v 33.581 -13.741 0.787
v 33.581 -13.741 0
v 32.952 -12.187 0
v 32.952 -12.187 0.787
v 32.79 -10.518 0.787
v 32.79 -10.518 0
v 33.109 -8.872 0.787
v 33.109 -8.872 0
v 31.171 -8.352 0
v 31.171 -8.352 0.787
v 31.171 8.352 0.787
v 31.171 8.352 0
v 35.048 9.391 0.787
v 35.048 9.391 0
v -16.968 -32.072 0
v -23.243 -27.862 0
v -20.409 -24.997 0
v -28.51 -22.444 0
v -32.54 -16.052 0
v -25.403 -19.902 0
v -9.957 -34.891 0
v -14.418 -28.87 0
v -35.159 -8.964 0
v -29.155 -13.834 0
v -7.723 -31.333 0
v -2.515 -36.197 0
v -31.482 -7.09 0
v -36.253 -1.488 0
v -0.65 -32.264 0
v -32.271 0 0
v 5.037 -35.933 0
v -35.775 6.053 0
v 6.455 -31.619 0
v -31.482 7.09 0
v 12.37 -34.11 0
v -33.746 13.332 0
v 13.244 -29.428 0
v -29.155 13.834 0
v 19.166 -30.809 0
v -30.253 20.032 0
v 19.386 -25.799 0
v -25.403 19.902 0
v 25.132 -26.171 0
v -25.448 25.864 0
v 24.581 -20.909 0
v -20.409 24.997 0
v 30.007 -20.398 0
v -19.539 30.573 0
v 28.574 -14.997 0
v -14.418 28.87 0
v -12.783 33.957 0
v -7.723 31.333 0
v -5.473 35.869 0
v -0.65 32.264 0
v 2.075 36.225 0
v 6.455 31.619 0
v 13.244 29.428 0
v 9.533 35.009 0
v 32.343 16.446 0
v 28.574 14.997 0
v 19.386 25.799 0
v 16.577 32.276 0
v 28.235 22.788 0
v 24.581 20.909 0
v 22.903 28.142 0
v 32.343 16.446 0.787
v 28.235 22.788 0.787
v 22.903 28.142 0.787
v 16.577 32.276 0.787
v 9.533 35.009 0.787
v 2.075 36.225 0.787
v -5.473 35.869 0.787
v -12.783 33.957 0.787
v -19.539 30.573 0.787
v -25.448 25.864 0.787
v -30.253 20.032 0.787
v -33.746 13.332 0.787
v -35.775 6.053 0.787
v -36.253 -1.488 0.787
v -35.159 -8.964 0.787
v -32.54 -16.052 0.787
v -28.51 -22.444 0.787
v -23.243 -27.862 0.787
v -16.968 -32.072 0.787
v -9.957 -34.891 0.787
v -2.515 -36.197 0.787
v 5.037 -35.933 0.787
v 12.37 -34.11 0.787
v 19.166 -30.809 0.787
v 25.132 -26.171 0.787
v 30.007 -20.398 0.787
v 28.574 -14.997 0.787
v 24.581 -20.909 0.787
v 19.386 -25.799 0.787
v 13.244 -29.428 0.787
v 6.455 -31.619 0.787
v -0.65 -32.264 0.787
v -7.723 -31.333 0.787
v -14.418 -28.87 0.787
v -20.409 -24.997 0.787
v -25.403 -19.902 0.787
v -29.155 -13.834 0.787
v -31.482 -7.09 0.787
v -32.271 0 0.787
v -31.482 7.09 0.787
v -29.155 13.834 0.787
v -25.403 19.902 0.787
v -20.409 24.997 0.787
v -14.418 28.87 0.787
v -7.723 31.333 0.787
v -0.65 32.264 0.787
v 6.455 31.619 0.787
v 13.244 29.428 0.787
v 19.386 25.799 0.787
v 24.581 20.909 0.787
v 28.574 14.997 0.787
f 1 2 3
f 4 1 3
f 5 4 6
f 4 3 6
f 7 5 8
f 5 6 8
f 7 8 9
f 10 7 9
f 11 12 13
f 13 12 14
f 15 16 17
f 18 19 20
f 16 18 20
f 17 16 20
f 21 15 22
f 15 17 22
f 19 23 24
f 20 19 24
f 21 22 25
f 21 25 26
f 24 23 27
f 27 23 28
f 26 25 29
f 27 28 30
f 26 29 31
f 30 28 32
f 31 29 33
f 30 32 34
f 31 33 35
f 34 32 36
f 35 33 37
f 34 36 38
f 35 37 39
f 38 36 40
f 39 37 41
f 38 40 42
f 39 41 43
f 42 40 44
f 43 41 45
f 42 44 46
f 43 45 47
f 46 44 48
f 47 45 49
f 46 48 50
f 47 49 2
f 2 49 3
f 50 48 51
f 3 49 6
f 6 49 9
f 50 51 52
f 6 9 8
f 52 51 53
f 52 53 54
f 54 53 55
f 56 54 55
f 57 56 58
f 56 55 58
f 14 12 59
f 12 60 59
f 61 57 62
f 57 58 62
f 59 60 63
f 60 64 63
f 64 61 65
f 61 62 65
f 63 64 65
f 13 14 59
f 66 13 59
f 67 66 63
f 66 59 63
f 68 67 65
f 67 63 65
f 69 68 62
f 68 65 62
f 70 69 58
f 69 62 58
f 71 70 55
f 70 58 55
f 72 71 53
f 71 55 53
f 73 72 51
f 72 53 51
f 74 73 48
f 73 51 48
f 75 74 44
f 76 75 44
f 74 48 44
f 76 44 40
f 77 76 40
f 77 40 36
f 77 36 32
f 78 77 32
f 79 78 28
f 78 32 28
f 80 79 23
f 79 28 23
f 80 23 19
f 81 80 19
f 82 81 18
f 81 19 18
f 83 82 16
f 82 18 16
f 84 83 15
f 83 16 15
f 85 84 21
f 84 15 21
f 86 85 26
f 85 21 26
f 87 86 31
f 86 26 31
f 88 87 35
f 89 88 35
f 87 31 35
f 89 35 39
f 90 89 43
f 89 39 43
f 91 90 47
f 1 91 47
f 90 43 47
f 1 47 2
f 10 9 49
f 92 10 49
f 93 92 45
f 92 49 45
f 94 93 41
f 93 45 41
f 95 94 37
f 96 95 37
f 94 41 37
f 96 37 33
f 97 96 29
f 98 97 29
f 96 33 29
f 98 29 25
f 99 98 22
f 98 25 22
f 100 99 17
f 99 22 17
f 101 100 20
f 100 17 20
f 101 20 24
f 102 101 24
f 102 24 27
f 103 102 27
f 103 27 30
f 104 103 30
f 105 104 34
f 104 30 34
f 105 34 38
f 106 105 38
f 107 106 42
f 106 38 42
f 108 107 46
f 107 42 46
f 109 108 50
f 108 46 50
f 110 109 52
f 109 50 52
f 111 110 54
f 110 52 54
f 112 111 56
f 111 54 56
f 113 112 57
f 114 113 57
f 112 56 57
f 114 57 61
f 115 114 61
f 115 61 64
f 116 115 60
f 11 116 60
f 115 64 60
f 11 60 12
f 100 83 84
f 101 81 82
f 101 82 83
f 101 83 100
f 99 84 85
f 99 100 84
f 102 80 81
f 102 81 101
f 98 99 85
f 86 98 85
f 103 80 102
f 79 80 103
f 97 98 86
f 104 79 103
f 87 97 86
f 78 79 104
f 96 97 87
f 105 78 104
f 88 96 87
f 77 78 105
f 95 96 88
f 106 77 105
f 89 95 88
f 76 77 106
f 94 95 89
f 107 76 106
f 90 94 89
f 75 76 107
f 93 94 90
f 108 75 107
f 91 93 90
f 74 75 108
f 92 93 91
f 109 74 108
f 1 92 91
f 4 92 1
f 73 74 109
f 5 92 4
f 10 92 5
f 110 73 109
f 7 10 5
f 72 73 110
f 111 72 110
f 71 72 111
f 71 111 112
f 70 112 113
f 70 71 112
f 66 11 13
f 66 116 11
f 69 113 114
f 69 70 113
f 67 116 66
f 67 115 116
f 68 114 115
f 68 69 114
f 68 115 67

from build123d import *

# Parameters (mm, degrees)
BOSS_EXTRUDE1_DEPTH = 0.7874


with BuildPart() as part:
    # Sketch2 → Boss-Extrude1 (new body)
    with BuildSketch(Plane.XY):
        with BuildLine():
            Line((31.171102562, 8.352271759), (33.109329325, 8.871618055))
            Line((33.109329325, 8.871618055), (35.047556088, 9.390964351))
            ThreePointArc((35.047556088, 9.390964351), (-36.211242798, 2.295058655), (33.581480457, -13.740653898))
            ThreePointArc((33.581480457, -13.740653898), (32.810406003, -11.358014898), (33.109329325, -8.871618055))
            Line((33.109329325, -8.871618055), (31.171102562, -8.352271759))
            ThreePointArc((31.171102562, -8.352271759), (-32.2707, 0), (31.171102562, 8.352271759))
        make_face()
    extrude(amount=BOSS_EXTRUDE1_DEPTH)


solid = part.part
